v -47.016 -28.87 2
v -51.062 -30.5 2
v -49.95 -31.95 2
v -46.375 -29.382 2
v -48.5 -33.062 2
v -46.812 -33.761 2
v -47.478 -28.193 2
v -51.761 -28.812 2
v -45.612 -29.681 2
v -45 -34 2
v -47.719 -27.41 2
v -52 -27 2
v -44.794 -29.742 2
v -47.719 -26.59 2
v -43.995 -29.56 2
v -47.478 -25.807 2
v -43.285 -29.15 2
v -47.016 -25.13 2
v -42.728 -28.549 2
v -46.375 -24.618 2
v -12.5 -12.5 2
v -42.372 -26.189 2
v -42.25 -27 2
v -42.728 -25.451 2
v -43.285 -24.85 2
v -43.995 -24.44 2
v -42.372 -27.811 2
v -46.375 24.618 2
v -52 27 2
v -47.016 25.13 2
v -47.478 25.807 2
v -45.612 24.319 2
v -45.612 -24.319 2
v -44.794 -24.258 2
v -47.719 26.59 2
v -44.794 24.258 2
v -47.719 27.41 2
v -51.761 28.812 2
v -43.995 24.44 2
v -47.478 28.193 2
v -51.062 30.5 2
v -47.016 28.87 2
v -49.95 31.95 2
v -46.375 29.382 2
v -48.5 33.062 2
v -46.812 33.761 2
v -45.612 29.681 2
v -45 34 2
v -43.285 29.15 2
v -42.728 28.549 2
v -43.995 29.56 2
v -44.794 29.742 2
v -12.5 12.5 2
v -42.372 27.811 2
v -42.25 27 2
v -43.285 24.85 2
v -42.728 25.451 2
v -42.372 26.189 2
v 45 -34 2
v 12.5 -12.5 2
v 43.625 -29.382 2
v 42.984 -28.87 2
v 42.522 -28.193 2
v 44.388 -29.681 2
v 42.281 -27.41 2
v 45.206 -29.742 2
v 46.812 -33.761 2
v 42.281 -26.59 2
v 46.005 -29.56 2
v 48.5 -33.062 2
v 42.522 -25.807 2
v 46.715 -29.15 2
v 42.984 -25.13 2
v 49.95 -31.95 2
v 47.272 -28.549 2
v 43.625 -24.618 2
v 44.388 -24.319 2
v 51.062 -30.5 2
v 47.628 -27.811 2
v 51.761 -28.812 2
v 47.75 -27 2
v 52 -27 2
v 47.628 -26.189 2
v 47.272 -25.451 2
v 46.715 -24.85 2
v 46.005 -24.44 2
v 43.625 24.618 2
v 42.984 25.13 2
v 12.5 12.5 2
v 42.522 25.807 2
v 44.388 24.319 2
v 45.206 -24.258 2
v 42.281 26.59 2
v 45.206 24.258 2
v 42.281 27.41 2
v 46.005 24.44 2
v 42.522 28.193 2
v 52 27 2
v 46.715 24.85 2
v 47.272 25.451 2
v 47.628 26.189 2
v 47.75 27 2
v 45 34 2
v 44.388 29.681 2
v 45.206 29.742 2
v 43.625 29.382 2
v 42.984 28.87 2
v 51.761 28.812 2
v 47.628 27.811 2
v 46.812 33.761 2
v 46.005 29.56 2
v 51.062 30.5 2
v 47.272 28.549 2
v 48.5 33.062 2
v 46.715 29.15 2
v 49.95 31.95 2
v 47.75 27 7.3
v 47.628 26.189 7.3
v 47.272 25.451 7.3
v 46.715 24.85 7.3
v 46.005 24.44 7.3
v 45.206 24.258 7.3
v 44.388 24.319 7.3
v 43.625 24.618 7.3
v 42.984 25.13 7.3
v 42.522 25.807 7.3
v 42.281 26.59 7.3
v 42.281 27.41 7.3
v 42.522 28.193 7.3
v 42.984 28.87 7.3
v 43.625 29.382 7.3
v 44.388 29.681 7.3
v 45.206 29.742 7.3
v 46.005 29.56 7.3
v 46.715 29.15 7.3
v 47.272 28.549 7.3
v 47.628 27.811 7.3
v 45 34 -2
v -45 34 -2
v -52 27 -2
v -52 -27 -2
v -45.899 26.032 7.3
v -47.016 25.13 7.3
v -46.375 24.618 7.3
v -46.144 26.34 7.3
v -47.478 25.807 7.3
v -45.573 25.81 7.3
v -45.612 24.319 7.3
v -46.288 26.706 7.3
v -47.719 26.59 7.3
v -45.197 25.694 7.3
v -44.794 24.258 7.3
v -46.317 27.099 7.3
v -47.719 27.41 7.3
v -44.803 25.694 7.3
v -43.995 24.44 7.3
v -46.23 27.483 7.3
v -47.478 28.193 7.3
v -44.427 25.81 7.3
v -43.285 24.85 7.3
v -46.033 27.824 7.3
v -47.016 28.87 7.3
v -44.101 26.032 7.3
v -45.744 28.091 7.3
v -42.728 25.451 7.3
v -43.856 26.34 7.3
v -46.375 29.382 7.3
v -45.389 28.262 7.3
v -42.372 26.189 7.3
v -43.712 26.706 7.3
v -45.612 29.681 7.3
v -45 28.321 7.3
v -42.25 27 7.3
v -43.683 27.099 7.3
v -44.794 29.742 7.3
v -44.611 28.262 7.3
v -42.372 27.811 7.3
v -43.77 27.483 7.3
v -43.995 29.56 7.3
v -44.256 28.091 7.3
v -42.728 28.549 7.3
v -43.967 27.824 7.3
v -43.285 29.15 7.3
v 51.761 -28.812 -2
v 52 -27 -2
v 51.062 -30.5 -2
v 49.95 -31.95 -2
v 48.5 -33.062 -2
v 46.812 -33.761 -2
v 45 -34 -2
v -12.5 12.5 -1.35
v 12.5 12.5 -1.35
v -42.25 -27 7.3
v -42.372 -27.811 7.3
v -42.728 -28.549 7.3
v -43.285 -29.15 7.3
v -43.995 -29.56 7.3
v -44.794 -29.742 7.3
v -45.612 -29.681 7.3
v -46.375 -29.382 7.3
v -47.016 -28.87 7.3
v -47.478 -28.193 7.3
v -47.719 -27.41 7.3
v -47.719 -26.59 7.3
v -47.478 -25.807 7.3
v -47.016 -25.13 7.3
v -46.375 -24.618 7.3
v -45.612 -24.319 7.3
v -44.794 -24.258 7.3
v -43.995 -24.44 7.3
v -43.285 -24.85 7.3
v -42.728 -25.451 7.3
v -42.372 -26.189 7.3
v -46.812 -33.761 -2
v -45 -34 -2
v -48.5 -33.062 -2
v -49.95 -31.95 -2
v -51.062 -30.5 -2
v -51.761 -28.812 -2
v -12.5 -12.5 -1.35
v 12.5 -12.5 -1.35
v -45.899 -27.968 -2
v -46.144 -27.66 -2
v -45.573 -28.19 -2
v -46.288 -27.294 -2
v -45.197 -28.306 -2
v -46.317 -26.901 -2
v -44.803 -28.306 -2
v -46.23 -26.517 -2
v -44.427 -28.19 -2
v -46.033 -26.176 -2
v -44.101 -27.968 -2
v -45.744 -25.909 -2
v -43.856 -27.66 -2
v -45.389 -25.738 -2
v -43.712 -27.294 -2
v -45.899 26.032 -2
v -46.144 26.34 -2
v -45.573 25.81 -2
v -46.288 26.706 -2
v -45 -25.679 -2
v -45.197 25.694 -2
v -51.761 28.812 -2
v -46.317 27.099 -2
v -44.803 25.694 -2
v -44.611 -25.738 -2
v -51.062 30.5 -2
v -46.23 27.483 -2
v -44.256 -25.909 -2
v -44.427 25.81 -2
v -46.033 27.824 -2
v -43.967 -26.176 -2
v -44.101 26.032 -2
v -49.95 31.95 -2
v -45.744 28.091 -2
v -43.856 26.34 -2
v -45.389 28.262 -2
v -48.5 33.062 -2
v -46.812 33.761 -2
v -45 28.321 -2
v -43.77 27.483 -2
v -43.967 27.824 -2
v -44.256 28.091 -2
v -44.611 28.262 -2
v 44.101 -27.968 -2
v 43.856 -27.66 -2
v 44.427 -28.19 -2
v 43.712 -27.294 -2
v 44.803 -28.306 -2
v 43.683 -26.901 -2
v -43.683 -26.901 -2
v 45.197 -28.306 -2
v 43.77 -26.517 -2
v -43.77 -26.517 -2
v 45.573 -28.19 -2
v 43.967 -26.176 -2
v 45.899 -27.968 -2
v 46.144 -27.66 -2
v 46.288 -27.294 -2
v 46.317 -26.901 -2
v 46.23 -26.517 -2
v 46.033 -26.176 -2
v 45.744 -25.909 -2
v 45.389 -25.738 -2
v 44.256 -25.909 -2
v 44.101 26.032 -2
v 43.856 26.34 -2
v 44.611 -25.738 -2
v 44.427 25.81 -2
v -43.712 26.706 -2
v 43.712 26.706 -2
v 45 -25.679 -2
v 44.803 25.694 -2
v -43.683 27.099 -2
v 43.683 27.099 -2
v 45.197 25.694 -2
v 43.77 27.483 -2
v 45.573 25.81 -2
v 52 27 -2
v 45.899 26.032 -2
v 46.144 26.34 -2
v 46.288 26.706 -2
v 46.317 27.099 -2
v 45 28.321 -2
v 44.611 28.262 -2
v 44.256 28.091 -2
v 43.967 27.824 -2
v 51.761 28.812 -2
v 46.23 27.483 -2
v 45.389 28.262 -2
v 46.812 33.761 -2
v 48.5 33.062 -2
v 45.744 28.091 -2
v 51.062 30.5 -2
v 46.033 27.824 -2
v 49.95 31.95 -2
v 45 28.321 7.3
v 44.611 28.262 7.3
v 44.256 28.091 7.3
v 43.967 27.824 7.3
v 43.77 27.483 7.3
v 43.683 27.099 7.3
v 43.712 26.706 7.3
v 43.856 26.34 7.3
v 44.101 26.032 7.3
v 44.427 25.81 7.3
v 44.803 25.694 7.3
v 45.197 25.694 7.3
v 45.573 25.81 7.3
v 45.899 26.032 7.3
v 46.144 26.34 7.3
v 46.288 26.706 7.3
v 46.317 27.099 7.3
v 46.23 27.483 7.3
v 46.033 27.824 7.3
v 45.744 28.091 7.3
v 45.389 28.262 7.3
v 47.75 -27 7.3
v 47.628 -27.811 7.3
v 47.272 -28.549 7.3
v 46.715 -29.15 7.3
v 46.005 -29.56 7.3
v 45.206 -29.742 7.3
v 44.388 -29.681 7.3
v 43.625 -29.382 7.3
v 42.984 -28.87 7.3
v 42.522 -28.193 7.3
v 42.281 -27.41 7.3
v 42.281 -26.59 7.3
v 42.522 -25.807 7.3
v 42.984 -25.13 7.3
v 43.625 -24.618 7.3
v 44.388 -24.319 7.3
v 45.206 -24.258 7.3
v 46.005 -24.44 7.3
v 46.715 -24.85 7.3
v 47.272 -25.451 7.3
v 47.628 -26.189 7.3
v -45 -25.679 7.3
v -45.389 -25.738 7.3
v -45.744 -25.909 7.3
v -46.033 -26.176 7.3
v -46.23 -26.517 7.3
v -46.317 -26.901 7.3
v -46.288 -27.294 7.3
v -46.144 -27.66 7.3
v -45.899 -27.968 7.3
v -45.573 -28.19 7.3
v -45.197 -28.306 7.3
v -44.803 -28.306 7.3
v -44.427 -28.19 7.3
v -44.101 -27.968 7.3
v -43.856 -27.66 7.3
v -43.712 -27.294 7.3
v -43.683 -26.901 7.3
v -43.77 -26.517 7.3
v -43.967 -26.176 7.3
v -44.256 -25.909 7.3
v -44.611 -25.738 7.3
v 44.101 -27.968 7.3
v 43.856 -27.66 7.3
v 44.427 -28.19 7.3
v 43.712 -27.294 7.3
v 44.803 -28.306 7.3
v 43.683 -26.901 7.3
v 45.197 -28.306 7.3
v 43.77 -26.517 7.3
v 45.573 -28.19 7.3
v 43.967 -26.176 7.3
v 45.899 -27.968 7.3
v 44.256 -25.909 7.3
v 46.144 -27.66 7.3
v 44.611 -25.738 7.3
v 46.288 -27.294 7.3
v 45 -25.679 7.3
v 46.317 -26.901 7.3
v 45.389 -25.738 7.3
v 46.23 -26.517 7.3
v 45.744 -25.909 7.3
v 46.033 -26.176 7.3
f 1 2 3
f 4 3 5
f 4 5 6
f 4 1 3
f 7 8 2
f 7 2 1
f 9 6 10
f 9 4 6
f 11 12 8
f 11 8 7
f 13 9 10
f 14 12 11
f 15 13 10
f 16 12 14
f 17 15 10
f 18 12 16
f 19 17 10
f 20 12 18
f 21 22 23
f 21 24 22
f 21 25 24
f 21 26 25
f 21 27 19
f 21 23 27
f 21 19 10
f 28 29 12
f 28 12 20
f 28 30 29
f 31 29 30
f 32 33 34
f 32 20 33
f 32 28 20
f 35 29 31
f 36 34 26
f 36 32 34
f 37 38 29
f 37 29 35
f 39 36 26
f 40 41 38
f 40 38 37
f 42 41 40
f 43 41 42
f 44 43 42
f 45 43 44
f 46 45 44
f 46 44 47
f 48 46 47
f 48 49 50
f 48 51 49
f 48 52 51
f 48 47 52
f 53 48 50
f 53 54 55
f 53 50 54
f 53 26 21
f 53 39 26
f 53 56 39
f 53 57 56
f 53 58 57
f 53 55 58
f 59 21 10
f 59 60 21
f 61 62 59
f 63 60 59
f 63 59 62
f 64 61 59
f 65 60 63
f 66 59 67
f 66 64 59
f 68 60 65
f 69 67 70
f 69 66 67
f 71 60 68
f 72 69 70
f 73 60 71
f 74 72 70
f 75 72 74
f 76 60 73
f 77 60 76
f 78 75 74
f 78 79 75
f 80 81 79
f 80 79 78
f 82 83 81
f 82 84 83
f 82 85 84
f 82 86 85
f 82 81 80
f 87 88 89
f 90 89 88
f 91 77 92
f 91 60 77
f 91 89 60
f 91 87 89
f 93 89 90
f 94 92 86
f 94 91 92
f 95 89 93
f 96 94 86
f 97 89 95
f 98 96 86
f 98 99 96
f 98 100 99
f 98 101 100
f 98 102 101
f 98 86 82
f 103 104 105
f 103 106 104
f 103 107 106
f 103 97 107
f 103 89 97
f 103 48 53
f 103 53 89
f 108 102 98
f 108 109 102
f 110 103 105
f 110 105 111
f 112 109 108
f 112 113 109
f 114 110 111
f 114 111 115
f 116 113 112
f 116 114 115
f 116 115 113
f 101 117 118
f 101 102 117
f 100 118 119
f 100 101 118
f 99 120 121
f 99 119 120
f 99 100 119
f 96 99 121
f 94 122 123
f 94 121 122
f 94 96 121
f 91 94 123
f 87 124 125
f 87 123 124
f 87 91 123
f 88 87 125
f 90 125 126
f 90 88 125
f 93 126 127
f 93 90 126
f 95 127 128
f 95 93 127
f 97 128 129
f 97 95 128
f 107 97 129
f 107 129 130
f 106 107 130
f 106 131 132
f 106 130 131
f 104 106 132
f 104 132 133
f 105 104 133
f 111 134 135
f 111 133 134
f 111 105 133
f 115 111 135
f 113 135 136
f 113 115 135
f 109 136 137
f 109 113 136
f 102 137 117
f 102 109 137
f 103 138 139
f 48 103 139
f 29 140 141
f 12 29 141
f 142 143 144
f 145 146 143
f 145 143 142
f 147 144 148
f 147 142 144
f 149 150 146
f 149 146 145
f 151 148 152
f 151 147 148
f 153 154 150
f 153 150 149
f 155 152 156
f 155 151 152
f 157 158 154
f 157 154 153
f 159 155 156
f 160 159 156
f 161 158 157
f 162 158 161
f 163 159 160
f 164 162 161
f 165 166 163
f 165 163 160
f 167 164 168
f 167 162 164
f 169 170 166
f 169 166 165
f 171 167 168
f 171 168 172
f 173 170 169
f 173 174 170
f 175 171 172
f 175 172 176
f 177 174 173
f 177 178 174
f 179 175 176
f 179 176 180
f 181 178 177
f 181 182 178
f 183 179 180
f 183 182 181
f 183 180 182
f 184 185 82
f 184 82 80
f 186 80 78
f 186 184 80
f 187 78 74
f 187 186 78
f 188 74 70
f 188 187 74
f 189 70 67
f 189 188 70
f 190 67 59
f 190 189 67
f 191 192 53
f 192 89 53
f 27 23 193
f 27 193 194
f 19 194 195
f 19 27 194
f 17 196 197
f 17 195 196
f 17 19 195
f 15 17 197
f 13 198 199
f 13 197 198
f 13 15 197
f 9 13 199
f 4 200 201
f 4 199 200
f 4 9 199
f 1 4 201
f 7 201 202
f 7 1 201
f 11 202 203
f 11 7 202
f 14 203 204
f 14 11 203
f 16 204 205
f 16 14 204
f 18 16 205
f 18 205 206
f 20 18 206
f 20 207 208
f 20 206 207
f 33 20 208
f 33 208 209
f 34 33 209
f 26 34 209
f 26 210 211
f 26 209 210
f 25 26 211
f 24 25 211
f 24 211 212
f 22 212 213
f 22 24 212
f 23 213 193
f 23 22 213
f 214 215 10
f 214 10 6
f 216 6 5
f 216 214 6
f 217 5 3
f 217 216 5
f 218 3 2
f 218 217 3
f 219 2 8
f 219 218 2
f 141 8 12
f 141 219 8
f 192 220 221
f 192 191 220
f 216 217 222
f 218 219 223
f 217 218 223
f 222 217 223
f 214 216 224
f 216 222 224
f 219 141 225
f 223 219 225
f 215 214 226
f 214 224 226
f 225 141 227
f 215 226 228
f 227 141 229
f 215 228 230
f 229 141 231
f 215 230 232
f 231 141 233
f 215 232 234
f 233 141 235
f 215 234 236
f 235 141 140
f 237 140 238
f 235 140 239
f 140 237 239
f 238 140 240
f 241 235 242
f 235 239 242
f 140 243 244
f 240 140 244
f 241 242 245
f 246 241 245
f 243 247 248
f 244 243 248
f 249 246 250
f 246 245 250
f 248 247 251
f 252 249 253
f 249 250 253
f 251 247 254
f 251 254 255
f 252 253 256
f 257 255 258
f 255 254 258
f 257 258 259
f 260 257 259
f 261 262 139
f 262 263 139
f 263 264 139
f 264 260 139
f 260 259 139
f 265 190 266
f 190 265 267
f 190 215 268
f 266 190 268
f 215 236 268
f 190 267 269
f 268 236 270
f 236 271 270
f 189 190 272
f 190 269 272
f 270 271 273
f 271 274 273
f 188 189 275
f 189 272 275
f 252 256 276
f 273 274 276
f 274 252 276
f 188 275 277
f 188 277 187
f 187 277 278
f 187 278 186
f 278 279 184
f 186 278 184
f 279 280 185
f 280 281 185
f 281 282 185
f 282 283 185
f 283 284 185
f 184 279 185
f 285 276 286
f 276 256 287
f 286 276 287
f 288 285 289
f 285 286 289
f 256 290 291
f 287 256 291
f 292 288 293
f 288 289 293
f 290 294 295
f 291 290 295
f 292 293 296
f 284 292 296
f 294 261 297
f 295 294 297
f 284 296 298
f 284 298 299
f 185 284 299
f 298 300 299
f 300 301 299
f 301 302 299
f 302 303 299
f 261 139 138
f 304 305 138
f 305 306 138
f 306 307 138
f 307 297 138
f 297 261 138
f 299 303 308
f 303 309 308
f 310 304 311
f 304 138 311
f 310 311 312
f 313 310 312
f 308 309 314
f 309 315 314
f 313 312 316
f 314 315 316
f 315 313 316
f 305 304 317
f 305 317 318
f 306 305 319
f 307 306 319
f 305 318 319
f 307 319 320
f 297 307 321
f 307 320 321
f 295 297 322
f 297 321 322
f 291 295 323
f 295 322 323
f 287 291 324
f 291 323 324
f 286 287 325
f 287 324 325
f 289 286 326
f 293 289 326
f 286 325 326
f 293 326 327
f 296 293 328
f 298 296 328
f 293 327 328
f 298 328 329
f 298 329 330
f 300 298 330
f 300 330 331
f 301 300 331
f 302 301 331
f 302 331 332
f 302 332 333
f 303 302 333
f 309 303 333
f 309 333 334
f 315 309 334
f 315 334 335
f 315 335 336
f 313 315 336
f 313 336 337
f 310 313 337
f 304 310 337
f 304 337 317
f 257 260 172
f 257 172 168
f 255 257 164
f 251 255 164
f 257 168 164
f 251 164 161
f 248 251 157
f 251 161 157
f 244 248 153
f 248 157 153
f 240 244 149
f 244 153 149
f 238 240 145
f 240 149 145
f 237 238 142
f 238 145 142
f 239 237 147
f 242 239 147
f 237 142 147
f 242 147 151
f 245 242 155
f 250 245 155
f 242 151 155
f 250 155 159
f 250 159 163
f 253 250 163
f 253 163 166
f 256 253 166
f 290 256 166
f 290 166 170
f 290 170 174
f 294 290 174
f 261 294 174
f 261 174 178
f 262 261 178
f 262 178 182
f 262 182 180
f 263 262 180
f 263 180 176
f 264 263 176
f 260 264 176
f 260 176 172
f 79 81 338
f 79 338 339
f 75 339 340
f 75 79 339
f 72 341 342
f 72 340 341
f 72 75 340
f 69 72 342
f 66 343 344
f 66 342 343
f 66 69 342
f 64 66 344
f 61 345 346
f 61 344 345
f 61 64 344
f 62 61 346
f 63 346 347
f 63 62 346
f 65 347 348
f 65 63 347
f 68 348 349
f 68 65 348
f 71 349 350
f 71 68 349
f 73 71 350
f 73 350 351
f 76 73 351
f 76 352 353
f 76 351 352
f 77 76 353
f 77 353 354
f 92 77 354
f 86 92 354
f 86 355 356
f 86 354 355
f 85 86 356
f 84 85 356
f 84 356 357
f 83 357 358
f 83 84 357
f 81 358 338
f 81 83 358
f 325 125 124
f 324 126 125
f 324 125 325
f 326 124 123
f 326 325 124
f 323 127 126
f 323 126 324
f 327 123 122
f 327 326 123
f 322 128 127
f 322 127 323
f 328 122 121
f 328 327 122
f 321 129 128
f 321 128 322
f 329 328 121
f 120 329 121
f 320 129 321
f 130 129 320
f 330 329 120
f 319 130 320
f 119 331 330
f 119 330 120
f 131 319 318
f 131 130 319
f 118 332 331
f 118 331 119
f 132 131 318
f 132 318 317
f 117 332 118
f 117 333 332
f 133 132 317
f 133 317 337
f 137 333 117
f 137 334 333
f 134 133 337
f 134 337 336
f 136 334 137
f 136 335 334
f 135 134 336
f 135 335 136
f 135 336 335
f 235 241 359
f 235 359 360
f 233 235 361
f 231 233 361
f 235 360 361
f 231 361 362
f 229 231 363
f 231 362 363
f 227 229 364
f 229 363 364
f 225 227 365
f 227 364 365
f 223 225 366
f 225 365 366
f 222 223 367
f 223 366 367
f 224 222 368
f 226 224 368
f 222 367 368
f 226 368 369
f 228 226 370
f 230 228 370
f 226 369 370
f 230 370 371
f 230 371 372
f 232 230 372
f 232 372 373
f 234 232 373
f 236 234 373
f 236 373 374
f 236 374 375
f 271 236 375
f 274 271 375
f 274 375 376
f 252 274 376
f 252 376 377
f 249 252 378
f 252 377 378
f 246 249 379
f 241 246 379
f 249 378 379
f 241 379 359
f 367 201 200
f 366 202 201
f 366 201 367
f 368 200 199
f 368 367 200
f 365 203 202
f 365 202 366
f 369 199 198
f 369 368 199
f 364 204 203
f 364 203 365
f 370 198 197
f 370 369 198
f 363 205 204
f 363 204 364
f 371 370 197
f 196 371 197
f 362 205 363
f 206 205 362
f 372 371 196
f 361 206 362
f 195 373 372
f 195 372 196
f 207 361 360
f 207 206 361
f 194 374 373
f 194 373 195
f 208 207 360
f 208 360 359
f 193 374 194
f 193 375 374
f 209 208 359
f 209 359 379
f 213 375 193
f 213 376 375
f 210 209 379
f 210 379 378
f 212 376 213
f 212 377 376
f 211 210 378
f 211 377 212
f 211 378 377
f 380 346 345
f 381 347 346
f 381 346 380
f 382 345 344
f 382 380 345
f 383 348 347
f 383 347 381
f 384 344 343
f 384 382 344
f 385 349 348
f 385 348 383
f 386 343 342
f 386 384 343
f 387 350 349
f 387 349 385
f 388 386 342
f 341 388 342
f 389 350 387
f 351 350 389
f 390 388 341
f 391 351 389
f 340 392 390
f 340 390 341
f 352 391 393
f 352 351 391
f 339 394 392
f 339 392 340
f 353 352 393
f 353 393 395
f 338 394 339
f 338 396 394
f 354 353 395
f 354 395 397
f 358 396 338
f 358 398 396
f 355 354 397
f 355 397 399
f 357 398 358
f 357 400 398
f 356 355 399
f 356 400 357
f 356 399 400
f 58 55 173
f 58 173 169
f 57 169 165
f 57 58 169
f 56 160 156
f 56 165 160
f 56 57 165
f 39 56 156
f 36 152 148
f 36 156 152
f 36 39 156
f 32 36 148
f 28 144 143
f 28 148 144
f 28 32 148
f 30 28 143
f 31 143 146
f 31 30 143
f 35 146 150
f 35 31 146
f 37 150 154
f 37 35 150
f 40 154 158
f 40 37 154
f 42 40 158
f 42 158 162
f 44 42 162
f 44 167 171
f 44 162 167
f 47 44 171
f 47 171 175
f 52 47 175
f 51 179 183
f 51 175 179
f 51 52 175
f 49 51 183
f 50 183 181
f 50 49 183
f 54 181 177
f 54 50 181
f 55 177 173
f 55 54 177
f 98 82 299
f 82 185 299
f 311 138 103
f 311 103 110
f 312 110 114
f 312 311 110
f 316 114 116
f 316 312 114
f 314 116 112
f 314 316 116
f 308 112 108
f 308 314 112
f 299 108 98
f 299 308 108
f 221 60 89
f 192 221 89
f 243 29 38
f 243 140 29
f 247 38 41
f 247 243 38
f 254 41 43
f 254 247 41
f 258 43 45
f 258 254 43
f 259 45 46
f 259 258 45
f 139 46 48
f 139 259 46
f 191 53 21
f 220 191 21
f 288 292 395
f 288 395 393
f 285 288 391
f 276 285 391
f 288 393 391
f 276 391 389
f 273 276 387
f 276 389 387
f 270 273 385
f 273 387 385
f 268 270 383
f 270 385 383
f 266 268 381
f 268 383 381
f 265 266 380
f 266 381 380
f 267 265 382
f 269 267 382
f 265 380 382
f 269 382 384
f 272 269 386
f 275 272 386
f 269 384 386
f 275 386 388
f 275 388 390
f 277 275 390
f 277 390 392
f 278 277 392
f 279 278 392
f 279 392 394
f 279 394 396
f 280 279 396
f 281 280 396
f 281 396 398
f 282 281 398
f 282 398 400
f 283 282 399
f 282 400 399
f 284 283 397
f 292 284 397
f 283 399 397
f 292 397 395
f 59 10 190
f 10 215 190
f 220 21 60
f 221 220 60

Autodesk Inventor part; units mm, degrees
ref_plane "YZ Plane" through (0, 0, 0) normal (1, 0, 0) x (0, 1, 0)
ref_plane "XZ Plane" through (0, 0, 0) normal (0, 1, 0) x (-1, 0, 0)
ref_plane "XY Plane" through (0, 0, 0) normal (0, 0, 1) x (1, 0, 0)
sketch "Sketch1" plane through (0, 0, 0) normal (0, 0, 1) x (1, 0, 0)
  line L0 (-45, -34) -> (45, -34)
  line L1 (52, -27) -> (52, 27)
  line L2 (45, 34) -> (-45, 34)
  line L3 (-52, 27) -> (-52, -27)
  line L4 (-52, -34) -> (52, 34) construction
  line L5 (52, -34) -> (-52, 34) construction
  line L6 (-45, 27) -> (45, 27) construction
  line L7 (45, 27) -> (45, -27) construction
  line L8 (45, -27) -> (-45, -27) construction
  line L9 (-45, -27) -> (-45, 27) construction
  arc A0 (-45, 34) -> (-52, 27) centre (-45, 27) ccw
  arc A1 (52, 27) -> (45, 34) centre (45, 27) ccw
  arc A2 (45, -34) -> (52, -27) centre (45, -27) ccw
  arc A3 (-52, -27) -> (-45, -34) centre (-45, -27) ccw
  point P0 (0, 0)
  dimension "d0" = 104
  dimension "d1" = 68
  dimension "d2" = 54
  dimension "d3" = 90
extrude "Extrusion1" add sketch "Sketch1" along normal mid plane 4
sketch "Sketch2" plane through (0, 0, 2) normal (0, 0, 1) x (1, 0, 0)
  line L0 (45, 34) -> (-45, 34) projected
  arc A0 (-45, 34) -> (-52, 27) centre (-45, 27) ccw projected
  line L1 (-52, 27) -> (-52, -27) projected
  arc A1 (-52, -27) -> (-45, -34) centre (-45, -27) ccw projected
  line L2 (-45, -34) -> (45, -34) projected
  arc A2 (45, -34) -> (52, -27) centre (45, -27) ccw projected
  line L3 (52, -27) -> (52, 27) projected
  arc A3 (52, 27) -> (45, 34) centre (45, 27) ccw projected
  circle A4 centre (-45, 27) radius 2.75
  circle A5 centre (45, 27) radius 2.75
  circle A6 centre (45, -27) radius 2.75
  circle A7 centre (-45, -27) radius 2.75
  point P0 (0, 0)
  dimension "d7" = 5.5
extrude "Extrusion2" add sketch "Sketch2" along normal blind 5.3 contours A4 | A5 | A6 | A7
sketch "Sketch3" plane through (0, 0, -2) normal (0, 0, -1) x (-1, 0, 0)
  line L0 (45, 34) -> (-45, 34) projected
  arc A0 (-45, 34) -> (-52, 27) centre (-45, 27) ccw projected
  line L1 (-52, 27) -> (-52, -27) projected
  arc A1 (-52, -27) -> (-45, -34) centre (-45, -27) ccw projected
  line L2 (-45, -34) -> (45, -34) projected
  arc A2 (45, -34) -> (52, -27) centre (45, -27) ccw projected
  line L3 (52, -27) -> (52, 27) projected
  arc A3 (52, 27) -> (45, 34) centre (45, 27) ccw projected
  circle A4 centre (-45, 27) radius 2.75 projected
  point P0 (0, 0)
hole "Hole1" at (-45, -27, -2) at (45, -27, -2) at (45, 27, -2) at (-45, 27, -2) direction (0, 0, 1) diameter 2.642 end through all thread size "6-32 UNC" class "2B" standard "ANSI Unified Screw Threads"
sketch "Sketch4" plane through (0, 0, 2) normal (0, 0, 1) x (1, 0, 0)
  line L0 (-12.5, -12.5) -> (12.5, -12.5)
  line L1 (12.5, -12.5) -> (12.5, 12.5)
  line L2 (12.5, 12.5) -> (-12.5, 12.5)
  line L3 (-12.5, 12.5) -> (-12.5, -12.5)
  line L4 (-12.5, -12.5) -> (12.5, 12.5) construction
  line L5 (12.5, -12.5) -> (-12.5, 12.5) construction
  point P0 (0, 0)
  dimension "d17" = 25
extrude "Extrusion3" cut sketch "Sketch4" against normal blind 3.35
properties part number "BackBracket" material "Steel, Mild"
